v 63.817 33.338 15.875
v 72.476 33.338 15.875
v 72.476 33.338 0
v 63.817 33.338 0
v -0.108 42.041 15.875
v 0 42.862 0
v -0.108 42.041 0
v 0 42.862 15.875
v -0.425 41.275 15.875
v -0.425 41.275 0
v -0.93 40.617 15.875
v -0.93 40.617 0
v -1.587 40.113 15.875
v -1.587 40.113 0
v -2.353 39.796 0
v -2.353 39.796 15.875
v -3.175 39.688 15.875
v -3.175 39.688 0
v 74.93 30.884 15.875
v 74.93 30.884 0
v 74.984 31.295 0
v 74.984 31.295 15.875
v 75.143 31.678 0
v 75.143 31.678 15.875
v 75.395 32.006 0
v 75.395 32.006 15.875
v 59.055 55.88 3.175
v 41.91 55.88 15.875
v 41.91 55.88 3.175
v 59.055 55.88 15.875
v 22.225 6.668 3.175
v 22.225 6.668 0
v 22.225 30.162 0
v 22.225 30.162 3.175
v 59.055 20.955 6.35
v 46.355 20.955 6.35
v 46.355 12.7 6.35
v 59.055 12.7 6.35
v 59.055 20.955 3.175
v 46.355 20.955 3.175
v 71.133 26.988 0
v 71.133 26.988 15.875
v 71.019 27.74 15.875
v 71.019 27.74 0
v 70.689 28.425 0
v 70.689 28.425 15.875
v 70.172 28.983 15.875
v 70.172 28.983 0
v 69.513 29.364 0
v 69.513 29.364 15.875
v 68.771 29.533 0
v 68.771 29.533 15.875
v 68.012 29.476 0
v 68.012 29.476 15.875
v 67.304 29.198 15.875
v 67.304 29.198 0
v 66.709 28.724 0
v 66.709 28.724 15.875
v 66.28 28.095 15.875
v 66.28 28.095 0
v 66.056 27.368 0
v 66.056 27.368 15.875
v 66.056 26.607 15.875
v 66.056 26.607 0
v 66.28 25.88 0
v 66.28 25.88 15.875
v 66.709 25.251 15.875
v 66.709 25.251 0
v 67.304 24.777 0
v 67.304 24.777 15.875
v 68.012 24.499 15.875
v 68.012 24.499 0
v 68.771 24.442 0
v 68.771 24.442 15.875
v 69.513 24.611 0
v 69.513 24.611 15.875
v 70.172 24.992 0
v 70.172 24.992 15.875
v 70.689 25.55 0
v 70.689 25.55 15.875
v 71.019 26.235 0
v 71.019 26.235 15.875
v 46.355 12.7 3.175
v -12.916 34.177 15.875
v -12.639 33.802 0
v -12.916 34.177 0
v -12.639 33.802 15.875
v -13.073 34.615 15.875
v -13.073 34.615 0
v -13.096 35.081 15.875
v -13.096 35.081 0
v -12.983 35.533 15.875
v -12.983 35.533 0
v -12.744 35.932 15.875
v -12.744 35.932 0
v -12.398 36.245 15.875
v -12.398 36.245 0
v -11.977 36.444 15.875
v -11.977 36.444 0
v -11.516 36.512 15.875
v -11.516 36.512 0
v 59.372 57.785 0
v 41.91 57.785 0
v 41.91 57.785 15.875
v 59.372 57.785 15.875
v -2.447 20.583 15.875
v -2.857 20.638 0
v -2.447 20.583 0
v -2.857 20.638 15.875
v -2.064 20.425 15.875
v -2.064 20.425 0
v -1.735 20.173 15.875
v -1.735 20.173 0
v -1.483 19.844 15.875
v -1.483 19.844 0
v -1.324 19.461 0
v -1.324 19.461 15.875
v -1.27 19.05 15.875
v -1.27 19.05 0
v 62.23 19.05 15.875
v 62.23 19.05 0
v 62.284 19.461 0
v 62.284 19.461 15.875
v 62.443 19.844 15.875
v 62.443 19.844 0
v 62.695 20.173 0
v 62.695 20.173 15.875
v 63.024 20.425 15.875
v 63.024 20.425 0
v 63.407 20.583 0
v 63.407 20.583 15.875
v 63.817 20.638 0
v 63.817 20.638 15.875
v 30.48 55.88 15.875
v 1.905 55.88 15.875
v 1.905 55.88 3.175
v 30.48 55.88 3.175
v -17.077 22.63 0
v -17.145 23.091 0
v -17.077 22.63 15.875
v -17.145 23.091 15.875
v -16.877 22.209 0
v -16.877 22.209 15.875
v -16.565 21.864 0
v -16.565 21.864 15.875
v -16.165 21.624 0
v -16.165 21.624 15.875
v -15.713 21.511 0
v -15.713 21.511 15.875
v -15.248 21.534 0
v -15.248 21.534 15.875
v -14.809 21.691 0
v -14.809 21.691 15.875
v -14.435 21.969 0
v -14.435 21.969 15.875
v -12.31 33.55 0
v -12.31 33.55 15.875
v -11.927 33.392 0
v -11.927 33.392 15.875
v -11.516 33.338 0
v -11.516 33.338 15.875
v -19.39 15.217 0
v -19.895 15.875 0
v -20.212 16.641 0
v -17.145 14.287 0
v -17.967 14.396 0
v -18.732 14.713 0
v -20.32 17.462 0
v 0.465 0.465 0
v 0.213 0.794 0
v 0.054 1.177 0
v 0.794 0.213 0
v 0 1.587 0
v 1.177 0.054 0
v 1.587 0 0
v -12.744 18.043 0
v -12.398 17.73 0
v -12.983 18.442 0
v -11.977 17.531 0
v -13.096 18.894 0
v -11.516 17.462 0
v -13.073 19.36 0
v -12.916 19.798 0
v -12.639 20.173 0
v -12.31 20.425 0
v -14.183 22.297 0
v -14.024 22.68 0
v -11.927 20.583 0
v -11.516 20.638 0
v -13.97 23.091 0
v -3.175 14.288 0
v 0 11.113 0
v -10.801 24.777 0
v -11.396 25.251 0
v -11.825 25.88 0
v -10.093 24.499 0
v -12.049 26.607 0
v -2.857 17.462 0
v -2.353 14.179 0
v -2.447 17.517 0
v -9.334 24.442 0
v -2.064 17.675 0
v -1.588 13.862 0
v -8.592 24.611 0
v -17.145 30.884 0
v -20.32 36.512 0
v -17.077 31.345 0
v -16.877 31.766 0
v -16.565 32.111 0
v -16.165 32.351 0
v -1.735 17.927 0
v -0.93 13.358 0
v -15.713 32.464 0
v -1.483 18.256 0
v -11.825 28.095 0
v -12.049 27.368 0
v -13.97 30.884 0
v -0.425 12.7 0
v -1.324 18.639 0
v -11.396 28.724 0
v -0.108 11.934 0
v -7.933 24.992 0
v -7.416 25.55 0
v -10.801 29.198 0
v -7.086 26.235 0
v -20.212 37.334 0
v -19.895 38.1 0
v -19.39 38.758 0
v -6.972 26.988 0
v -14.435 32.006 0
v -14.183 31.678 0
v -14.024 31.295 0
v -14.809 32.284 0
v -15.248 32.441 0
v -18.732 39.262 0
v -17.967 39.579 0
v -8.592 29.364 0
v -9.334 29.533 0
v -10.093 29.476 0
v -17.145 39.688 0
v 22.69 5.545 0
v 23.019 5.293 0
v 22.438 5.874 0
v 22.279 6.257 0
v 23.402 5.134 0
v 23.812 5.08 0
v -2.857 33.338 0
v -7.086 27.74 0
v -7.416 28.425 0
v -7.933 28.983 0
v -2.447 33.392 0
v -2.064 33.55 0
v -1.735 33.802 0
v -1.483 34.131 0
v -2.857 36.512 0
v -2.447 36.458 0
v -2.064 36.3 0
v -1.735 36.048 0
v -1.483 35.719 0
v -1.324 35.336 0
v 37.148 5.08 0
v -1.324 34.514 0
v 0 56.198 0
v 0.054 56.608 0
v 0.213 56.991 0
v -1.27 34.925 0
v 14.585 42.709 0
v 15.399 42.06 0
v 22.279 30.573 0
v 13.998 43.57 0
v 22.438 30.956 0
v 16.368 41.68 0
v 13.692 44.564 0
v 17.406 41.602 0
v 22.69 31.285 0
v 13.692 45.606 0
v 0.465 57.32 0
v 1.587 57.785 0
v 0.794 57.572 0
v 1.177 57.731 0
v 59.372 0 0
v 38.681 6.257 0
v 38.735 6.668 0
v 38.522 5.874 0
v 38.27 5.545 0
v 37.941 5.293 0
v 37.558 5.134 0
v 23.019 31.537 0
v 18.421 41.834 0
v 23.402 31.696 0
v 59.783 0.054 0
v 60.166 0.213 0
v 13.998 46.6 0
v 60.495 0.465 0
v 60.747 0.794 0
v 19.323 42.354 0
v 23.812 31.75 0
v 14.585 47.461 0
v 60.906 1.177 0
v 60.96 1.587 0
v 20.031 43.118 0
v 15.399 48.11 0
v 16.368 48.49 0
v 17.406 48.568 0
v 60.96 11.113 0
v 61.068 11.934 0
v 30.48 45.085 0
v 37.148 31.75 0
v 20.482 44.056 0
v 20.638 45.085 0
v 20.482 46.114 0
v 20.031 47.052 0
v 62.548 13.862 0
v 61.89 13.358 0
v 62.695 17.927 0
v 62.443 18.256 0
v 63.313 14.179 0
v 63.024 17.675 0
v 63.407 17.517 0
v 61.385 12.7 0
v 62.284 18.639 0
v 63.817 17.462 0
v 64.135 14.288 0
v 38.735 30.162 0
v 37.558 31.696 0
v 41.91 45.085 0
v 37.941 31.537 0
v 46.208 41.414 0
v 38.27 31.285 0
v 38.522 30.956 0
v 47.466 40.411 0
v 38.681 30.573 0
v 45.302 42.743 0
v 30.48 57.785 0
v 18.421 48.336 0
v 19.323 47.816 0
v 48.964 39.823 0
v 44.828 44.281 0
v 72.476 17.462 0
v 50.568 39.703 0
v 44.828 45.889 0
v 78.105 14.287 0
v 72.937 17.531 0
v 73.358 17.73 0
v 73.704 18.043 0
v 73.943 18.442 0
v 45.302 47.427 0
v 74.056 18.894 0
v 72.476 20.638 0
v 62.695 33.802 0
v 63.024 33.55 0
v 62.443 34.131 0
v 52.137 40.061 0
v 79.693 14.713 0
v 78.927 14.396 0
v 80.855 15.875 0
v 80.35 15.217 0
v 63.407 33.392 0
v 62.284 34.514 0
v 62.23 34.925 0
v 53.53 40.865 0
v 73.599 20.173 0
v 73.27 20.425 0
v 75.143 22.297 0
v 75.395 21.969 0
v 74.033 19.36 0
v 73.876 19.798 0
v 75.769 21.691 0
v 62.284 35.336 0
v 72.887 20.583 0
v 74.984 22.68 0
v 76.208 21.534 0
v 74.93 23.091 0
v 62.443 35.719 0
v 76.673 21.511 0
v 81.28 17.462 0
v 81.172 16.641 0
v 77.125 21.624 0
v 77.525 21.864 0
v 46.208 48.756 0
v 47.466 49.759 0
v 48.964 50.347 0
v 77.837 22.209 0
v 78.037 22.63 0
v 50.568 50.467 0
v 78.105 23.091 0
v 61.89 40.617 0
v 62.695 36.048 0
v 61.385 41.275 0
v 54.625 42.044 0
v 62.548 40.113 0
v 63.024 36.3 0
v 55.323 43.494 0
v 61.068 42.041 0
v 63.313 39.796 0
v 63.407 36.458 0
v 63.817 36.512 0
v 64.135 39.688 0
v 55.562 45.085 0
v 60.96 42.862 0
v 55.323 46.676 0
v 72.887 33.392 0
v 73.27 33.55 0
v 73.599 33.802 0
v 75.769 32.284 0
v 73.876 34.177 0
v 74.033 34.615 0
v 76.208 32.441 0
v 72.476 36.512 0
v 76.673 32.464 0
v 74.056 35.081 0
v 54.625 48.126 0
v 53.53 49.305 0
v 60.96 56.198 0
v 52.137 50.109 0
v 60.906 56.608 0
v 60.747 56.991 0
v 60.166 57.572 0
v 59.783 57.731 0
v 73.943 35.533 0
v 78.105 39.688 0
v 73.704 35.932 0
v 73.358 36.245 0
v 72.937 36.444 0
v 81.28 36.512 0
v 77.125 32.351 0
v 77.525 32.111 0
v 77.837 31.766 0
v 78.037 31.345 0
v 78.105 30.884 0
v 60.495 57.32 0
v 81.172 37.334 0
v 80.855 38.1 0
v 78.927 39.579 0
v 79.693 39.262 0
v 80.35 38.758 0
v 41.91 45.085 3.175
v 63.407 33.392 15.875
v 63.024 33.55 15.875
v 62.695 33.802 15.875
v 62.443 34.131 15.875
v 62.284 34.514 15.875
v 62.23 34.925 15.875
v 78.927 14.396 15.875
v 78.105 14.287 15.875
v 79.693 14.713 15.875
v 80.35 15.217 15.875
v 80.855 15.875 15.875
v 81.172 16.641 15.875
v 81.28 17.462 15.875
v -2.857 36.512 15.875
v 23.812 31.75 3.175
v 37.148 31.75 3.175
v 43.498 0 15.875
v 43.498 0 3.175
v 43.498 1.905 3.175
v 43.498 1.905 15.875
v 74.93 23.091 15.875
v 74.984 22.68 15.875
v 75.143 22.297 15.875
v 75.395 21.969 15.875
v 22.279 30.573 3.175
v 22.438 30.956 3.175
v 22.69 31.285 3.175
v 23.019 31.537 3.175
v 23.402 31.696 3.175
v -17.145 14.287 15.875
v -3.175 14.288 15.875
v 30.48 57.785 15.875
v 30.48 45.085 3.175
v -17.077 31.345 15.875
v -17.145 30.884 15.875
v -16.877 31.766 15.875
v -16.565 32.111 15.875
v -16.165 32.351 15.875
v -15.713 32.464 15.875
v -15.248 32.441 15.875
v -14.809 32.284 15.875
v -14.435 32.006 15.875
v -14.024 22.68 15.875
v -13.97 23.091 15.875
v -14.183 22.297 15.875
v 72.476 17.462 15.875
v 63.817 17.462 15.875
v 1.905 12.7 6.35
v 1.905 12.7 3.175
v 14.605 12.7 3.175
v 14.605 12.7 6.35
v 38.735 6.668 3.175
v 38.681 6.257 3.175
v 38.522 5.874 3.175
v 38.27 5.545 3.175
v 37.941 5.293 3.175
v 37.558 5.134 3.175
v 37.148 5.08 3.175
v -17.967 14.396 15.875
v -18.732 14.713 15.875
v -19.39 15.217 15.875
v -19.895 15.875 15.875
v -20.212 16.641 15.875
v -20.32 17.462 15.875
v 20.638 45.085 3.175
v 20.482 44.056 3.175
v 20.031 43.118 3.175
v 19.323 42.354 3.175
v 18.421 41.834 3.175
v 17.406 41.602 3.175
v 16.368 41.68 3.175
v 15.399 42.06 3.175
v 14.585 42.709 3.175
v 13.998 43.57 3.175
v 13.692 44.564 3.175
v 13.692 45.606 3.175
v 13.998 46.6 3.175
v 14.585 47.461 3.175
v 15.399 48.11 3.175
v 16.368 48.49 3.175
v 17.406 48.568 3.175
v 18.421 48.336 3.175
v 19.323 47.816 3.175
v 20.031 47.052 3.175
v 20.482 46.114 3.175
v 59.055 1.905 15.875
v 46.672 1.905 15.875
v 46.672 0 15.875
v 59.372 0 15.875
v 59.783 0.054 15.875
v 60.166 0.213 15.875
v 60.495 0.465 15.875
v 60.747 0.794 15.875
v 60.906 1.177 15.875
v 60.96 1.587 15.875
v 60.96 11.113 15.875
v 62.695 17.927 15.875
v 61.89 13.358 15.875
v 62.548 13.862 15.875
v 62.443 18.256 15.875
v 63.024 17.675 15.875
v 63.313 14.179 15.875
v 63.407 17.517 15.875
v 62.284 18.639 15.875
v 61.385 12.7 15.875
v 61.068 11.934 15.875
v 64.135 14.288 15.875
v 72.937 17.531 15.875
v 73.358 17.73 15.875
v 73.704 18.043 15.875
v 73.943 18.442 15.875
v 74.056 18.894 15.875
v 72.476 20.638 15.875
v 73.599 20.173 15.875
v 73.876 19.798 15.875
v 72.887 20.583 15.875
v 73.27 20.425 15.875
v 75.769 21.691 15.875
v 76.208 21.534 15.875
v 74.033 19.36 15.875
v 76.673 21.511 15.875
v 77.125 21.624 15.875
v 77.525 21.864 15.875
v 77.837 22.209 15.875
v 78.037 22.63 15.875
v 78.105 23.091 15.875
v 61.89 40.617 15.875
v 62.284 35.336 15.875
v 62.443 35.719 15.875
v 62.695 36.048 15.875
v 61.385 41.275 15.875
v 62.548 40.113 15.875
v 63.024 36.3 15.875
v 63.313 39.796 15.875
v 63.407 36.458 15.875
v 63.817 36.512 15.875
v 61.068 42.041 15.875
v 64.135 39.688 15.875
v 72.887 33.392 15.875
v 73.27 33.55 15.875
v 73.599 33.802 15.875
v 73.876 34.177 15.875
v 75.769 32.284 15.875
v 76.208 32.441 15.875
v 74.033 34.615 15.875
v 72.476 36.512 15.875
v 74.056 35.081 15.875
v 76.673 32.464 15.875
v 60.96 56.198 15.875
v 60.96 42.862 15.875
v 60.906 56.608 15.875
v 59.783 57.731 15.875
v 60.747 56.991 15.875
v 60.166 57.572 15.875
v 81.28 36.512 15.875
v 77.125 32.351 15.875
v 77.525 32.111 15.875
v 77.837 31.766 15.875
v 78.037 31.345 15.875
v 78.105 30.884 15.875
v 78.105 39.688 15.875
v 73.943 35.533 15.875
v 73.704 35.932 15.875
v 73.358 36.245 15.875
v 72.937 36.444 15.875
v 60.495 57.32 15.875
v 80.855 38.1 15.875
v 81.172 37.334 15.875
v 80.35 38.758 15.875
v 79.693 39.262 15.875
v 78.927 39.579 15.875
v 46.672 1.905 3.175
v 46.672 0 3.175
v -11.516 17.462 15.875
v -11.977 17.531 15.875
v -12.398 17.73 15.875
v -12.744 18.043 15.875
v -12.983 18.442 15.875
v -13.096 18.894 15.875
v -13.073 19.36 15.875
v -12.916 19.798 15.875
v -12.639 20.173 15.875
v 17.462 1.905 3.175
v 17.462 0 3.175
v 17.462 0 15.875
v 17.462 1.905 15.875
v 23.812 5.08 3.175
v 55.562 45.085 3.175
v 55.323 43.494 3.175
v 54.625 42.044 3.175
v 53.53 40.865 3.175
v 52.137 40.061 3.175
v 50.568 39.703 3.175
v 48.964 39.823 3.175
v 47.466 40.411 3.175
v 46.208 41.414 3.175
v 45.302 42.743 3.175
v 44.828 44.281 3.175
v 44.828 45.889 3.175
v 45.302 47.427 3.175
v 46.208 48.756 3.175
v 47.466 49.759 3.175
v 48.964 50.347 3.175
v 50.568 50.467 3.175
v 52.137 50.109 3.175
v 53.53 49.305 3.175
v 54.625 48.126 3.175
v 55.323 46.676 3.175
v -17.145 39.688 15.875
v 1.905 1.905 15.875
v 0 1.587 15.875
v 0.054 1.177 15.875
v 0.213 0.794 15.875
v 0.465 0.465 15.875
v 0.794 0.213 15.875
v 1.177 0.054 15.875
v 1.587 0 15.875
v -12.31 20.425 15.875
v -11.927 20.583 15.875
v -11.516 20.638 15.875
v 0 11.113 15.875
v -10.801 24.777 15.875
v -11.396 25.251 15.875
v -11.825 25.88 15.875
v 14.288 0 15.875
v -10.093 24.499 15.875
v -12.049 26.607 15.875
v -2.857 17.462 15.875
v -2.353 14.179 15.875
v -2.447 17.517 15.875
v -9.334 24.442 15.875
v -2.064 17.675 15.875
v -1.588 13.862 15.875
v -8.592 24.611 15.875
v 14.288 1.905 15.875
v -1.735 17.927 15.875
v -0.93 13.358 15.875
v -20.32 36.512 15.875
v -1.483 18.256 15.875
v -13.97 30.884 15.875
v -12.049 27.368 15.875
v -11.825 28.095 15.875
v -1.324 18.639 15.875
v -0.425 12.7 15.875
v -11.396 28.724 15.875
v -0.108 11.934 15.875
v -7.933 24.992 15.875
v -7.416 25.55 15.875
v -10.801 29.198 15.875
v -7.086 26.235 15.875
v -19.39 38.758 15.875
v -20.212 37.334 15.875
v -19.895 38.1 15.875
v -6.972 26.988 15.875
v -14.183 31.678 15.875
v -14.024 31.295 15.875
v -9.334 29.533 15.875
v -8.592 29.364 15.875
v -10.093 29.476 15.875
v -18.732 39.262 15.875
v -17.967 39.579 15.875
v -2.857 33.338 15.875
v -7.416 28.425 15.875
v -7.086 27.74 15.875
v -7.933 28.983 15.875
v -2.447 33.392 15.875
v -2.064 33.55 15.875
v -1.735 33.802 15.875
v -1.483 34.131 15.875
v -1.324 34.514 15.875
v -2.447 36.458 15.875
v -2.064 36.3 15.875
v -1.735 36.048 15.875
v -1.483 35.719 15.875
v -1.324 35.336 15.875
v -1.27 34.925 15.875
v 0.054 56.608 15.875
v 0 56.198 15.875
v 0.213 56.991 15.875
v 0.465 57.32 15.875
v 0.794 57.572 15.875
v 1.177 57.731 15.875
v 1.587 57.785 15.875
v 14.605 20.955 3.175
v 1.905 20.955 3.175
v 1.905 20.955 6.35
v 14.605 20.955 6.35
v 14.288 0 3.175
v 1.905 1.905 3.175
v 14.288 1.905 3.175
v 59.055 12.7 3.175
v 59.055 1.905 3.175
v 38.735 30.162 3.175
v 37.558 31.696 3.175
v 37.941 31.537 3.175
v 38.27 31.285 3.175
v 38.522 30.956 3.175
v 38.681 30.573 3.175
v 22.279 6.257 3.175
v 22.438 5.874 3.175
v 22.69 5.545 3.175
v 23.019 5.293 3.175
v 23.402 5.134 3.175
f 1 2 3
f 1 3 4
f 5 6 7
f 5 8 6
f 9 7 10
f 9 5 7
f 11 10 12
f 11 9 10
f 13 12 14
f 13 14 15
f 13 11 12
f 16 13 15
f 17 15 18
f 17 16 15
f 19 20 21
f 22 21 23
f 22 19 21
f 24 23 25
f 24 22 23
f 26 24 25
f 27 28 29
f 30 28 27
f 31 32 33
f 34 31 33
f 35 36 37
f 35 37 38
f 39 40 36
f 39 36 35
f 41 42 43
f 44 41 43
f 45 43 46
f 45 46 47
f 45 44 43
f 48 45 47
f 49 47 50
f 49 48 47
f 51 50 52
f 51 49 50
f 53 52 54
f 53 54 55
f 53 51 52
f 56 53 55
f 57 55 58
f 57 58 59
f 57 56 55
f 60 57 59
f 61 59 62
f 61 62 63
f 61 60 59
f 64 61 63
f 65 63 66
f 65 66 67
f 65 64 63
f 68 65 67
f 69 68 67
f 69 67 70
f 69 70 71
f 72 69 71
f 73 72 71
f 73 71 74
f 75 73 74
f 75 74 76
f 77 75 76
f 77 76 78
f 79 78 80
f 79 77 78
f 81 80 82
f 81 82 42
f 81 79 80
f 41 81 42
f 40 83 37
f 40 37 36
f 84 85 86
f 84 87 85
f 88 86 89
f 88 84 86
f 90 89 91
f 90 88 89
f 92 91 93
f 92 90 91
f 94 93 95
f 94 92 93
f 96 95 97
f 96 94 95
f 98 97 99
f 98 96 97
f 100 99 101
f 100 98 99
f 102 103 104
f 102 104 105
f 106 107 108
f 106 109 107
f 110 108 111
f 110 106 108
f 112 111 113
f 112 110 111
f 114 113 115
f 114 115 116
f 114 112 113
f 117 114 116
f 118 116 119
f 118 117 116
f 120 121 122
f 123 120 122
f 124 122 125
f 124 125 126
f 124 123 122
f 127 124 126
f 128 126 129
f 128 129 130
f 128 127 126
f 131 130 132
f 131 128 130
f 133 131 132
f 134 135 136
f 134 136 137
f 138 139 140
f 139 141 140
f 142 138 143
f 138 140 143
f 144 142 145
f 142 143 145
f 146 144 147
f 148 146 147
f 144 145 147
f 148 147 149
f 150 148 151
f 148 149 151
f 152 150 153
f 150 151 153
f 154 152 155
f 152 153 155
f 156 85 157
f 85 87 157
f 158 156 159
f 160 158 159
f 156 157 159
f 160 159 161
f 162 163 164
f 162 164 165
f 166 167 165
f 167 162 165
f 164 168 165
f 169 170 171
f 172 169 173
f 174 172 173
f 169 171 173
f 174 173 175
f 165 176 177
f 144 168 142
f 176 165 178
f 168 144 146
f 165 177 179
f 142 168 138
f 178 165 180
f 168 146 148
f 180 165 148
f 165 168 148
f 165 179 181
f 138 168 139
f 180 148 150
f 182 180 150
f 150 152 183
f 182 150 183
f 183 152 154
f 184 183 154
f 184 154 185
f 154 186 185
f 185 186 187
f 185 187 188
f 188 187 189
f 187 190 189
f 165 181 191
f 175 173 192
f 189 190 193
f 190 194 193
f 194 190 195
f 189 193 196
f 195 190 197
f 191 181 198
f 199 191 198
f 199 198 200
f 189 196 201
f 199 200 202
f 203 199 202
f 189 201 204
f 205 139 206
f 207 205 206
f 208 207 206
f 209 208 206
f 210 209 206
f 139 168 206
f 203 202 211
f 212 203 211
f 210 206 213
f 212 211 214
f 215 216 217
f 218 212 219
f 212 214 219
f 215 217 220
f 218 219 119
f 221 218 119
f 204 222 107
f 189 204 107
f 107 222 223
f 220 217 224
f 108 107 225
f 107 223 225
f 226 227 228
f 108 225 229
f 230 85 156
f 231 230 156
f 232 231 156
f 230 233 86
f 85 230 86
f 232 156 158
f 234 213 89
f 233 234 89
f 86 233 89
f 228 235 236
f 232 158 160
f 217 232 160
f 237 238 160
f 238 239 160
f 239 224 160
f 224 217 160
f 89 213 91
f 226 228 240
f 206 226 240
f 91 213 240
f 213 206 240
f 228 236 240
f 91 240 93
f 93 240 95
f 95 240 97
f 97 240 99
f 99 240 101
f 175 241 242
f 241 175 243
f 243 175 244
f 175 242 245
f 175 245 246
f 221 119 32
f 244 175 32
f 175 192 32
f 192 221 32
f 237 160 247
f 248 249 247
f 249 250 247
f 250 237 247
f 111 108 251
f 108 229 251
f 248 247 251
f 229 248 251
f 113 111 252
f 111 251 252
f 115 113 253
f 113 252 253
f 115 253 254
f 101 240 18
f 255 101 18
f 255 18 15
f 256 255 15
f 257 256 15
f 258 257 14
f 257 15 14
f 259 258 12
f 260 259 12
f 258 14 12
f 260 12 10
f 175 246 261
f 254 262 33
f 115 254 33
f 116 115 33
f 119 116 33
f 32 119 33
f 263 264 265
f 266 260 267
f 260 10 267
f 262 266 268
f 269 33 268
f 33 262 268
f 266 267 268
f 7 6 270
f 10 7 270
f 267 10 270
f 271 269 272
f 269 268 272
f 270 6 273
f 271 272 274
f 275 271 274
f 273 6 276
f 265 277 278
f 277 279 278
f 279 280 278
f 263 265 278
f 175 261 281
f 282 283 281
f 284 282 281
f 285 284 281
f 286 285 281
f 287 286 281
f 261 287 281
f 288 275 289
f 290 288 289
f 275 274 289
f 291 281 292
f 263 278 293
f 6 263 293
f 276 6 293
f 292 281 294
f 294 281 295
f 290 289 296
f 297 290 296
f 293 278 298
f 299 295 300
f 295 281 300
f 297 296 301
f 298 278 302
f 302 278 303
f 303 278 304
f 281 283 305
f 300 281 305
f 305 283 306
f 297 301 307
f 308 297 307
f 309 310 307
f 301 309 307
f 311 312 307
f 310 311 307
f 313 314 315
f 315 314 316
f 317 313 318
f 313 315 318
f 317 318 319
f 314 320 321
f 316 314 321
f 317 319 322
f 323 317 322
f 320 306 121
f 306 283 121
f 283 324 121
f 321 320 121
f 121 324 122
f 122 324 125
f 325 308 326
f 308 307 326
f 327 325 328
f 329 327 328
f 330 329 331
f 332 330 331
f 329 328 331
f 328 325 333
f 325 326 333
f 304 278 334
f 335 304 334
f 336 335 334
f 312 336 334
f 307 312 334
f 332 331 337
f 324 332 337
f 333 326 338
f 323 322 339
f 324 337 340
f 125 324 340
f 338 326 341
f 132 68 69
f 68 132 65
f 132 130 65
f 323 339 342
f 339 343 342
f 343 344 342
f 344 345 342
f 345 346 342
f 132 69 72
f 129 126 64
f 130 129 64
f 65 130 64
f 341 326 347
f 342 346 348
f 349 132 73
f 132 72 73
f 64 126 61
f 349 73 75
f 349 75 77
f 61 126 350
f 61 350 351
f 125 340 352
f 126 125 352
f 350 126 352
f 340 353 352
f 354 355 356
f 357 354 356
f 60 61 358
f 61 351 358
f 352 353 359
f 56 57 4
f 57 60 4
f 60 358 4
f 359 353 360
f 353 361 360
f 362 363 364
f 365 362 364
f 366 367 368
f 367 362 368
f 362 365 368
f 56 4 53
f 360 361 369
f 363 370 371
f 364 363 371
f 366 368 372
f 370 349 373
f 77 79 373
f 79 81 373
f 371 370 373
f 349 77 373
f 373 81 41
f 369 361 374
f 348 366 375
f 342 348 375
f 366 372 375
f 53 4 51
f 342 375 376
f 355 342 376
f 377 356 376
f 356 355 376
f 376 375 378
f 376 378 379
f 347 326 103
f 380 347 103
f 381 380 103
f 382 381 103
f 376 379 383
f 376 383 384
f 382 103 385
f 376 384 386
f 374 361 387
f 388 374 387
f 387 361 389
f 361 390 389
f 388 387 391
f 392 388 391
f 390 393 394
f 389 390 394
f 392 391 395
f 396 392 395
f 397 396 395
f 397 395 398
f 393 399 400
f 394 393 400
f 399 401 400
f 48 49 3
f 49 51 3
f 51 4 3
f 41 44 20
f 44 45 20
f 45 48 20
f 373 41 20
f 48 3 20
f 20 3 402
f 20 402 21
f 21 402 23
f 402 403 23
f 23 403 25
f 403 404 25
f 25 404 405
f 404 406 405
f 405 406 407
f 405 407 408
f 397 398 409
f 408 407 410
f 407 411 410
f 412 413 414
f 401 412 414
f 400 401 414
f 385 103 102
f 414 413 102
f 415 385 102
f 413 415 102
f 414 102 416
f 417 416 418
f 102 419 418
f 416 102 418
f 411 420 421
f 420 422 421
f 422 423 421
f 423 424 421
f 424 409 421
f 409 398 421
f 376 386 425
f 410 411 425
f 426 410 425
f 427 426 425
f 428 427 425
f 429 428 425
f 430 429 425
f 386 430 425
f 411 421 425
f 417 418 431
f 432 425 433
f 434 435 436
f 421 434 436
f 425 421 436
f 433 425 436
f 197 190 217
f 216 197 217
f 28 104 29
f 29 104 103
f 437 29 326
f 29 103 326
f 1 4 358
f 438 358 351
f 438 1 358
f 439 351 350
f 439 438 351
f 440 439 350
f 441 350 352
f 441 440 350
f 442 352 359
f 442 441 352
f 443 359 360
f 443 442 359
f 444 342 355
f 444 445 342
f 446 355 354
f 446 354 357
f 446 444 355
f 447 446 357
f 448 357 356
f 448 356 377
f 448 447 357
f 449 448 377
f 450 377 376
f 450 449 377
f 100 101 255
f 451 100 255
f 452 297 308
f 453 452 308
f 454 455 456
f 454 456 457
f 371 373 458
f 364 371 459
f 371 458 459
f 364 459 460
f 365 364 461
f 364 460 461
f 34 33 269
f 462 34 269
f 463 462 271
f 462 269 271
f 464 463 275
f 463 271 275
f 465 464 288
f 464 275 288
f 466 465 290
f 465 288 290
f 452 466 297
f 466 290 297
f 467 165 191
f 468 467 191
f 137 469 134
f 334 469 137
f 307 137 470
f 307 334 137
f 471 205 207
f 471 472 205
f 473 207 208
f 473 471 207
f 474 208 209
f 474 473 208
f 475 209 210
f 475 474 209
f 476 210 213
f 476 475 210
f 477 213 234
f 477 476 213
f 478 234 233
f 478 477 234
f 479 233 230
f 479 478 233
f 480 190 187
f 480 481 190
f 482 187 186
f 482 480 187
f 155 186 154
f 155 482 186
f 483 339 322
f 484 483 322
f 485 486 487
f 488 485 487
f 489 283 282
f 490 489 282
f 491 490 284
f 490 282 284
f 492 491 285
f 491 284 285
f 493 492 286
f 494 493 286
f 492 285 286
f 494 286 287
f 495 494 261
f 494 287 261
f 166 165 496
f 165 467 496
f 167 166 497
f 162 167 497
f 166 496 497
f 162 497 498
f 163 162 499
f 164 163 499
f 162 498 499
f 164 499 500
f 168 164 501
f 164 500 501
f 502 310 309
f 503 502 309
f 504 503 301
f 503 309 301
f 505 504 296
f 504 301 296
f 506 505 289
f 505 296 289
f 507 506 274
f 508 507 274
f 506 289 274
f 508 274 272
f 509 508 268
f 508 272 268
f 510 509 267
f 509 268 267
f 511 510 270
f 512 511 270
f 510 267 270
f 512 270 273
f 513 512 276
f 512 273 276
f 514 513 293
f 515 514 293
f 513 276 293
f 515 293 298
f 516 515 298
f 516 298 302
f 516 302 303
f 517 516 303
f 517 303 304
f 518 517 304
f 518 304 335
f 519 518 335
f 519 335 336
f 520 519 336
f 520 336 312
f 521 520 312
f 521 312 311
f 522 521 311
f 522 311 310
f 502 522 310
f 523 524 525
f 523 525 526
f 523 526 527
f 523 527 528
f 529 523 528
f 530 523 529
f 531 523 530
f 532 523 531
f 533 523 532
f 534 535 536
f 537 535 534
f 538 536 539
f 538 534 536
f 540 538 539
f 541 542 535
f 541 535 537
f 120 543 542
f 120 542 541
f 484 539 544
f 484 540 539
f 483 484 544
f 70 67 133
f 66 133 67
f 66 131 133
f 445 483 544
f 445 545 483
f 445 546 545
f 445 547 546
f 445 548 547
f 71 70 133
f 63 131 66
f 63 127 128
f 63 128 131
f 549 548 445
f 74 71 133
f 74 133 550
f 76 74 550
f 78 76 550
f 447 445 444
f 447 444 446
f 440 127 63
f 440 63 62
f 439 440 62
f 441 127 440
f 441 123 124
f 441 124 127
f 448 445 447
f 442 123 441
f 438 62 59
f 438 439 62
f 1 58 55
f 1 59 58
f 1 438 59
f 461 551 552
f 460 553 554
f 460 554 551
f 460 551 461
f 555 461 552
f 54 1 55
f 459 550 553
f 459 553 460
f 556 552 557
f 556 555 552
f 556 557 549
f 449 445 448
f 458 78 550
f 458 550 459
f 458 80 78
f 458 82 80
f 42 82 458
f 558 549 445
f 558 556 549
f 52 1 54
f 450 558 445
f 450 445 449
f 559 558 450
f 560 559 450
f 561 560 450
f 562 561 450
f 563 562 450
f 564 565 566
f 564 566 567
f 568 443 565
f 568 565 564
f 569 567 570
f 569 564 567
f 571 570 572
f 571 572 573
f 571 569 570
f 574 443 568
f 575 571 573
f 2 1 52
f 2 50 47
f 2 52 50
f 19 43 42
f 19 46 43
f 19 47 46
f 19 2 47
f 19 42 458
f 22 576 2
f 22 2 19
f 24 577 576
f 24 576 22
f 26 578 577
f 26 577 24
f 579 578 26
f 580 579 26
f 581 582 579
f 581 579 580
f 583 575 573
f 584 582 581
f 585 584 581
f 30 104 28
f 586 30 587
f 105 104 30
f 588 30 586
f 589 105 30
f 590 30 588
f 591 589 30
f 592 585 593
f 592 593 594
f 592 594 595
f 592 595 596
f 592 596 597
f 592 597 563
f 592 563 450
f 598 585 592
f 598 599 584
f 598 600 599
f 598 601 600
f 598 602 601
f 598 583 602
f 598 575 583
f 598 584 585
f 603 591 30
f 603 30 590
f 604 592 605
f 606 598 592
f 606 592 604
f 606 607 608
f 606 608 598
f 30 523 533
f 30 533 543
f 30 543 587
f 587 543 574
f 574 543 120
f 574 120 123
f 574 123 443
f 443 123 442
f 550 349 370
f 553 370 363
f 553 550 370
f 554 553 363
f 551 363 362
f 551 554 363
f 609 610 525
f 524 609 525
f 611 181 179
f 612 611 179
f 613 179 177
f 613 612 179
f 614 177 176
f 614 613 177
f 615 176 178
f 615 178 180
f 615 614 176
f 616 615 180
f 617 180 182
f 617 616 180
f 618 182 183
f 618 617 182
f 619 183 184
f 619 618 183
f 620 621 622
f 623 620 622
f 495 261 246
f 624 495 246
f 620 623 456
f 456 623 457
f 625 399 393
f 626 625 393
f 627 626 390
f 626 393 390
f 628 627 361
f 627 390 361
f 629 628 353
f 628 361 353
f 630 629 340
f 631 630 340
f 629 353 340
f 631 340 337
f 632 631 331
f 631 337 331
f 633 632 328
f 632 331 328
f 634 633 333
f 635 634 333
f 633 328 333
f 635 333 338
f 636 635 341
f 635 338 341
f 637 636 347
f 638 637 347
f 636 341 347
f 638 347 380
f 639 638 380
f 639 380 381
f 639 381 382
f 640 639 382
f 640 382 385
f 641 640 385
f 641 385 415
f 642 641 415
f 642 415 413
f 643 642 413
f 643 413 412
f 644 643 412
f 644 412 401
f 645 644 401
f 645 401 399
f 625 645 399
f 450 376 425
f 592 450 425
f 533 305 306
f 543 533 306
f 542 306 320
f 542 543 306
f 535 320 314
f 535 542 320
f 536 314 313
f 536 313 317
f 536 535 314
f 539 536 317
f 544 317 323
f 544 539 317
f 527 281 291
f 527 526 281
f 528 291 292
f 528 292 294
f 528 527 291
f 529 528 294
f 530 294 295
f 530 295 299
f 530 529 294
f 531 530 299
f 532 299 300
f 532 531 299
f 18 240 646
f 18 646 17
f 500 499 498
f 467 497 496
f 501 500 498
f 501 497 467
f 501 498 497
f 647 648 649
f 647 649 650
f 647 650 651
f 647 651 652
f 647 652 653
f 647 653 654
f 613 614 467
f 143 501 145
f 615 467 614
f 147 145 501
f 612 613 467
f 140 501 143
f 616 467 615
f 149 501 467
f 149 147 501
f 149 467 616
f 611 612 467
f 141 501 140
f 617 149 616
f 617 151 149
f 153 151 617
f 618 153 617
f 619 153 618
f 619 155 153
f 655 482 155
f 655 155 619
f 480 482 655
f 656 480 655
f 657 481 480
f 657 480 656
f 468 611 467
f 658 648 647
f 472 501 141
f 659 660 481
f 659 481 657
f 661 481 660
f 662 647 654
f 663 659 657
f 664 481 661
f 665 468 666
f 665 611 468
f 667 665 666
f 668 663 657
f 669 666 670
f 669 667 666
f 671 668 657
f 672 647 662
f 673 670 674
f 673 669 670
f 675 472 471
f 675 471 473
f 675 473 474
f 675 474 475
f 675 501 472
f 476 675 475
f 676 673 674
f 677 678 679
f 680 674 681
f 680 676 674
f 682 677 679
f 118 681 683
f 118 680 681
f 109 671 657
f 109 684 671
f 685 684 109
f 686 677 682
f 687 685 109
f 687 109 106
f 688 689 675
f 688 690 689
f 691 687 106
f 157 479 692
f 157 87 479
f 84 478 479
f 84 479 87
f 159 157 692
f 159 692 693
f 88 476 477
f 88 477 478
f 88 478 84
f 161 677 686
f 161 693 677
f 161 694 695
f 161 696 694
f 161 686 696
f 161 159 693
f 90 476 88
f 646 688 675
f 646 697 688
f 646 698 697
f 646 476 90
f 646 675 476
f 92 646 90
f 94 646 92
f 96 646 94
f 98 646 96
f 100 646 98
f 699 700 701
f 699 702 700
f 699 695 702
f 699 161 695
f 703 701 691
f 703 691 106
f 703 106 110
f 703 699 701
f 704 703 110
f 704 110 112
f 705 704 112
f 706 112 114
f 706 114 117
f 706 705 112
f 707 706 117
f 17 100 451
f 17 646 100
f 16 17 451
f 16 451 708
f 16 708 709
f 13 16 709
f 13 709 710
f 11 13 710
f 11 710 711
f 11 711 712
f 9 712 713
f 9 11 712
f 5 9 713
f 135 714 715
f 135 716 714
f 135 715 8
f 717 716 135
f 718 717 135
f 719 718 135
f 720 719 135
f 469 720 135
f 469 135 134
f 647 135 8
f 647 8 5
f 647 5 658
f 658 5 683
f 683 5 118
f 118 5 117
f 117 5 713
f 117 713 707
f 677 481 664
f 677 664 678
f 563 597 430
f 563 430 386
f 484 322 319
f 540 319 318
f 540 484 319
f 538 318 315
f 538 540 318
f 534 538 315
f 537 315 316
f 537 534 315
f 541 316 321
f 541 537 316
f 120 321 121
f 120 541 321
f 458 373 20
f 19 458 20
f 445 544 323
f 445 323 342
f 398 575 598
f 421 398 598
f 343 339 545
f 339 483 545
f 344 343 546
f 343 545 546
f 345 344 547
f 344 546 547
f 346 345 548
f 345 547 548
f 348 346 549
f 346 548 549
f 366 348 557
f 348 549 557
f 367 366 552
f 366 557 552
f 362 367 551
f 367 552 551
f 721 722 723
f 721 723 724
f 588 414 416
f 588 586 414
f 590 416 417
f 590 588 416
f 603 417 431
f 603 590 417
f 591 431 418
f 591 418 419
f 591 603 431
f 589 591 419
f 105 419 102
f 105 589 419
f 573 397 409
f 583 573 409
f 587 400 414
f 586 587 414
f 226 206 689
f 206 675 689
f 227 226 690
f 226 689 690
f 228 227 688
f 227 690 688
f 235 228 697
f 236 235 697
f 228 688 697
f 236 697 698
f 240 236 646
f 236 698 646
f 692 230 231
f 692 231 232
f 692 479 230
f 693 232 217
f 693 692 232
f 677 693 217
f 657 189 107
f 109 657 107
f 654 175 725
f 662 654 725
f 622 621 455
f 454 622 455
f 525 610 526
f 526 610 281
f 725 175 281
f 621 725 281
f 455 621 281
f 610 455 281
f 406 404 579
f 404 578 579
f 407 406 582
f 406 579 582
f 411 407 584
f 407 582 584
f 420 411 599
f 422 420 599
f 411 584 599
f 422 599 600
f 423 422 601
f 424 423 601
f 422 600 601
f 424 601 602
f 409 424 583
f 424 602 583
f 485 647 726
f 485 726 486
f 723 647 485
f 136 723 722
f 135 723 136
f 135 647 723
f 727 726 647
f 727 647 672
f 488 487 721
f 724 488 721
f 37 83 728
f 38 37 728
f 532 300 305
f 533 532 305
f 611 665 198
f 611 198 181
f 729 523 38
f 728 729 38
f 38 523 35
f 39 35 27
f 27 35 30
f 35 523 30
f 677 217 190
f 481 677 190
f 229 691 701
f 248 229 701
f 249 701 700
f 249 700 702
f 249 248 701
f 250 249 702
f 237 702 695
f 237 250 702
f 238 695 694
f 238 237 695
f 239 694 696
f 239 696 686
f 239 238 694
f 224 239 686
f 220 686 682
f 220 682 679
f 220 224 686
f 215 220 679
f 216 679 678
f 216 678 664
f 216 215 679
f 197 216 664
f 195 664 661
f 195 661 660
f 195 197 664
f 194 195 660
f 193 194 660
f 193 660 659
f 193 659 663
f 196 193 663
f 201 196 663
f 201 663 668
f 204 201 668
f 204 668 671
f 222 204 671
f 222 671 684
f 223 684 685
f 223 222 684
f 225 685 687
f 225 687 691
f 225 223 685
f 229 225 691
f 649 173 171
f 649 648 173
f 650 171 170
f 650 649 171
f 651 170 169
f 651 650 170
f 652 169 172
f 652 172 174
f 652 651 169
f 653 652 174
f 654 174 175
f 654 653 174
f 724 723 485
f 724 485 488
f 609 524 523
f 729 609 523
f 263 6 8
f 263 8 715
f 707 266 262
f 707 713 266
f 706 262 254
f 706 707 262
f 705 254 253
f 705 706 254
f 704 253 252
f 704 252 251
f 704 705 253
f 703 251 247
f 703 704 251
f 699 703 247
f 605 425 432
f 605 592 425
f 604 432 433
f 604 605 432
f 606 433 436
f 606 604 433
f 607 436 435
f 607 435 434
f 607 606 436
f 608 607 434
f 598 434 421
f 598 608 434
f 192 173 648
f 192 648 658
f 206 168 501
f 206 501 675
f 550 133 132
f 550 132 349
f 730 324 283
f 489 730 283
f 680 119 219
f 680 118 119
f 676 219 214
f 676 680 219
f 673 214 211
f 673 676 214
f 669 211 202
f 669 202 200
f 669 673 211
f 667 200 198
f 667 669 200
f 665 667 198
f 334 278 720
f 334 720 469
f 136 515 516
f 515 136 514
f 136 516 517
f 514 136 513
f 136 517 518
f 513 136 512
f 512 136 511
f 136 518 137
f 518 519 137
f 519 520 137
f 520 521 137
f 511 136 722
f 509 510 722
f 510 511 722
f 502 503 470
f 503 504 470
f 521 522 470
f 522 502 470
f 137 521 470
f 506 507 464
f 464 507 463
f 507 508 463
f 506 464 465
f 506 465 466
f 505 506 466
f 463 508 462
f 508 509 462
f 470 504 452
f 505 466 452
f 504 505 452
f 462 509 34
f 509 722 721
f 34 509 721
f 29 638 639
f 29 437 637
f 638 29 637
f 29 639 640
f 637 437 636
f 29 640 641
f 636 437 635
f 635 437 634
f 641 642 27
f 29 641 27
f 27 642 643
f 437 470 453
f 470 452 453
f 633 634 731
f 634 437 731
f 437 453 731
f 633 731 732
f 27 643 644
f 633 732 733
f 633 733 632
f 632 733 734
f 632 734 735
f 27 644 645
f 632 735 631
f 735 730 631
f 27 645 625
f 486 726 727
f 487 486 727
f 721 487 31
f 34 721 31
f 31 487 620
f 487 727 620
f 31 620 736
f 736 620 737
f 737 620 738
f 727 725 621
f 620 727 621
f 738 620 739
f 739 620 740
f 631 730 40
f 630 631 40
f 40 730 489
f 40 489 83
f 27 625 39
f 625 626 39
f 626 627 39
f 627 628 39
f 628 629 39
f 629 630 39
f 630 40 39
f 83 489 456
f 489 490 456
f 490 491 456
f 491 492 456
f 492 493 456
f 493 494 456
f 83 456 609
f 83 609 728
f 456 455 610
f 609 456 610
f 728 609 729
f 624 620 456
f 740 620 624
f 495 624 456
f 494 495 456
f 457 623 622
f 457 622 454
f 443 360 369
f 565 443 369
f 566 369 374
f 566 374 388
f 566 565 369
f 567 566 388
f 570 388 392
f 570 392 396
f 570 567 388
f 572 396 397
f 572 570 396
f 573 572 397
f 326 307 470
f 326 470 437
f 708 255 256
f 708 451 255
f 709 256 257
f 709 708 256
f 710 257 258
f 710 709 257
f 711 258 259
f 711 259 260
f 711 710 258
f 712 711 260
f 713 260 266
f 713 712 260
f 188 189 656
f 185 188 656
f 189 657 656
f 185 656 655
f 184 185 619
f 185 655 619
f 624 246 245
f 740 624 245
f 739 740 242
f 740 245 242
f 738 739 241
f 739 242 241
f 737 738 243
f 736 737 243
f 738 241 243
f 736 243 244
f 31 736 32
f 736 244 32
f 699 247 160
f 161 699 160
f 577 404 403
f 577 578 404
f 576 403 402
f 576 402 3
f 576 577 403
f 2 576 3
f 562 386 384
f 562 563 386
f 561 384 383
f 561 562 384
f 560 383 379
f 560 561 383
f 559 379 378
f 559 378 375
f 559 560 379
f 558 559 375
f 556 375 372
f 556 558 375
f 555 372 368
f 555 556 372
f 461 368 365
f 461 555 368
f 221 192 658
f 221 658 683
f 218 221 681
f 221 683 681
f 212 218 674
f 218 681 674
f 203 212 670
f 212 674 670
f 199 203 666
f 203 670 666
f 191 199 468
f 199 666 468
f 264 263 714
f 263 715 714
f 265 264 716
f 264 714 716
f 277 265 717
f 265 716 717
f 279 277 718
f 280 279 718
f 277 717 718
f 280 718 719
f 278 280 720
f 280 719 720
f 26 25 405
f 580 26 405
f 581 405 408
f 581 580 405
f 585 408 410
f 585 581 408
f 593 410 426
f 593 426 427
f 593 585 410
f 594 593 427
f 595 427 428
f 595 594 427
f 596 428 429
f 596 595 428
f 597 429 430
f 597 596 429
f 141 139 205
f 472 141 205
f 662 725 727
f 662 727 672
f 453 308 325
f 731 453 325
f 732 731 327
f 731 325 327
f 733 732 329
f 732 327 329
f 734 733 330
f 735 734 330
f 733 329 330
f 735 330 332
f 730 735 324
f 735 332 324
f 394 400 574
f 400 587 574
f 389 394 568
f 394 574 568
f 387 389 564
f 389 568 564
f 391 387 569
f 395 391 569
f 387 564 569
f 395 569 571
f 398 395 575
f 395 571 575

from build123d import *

# Parameters (mm, degrees)
F0_W      = 60.96
F0_H      = 57.785
F1_DEPTH  = 15.875
F2_W      = 57.15
F2_H      = 53.975
F3_DEPTH  = 12.7
F4_R      = 3.4925
F4_R_2    = 5.3975
F5_DEPTH  = 15.876
F6_W      = 12.7
F6_H      = 8.255
F7_DEPTH  = 3.175
F4_W      = 11.43
F4_H      = 12.7
F10_DEPTH = 25.4
F11_R     = 1.5875
F12_W     = 20.32
F12_H     = 25.4
F12_R     = 2.5527
F13_DEPTH = 15.875
F14_R     = 3.175
F15_R     = 1.58749
F16_W     = 3.175
F16_H     = 12.7
F17_DEPTH = 1.905


# Not quite as in the source:
# - a fillet or chamfer is up to 0.001 mm smaller than in the source, because OpenCascade refuses the exact size
# - a feature names something its author has since deleted; it is built from what else it names


with BuildPart() as f1:
    # F0 (on Top) → F1 (new body)
    with BuildSketch(Plane.XY):
        with Locations((30.48, 28.8925)):
            Rectangle(F0_W, F0_H)
    extrude(amount=F1_DEPTH)

    # F2 (on face) → F3 (cut)
    with BuildSketch(Plane.XY.offset(15.875)):
        with Locations((30.48, 28.8925)):
            Rectangle(F2_W, F2_H)
    extrude(amount=-F3_DEPTH, mode=Mode.SUBTRACT)

    # F4 (on face) → F5 (cut, through all)
    with BuildSketch(Plane(origin=(0, 0, 0), x_dir=(1, 0, 0), z_dir=(0, 0, -1))):
        with Locations((17.145, -45.085)):
            Circle(F4_R)
        with Locations((50.165, -45.085)):
            Circle(F4_R_2)
        with BuildLine():
            Line((37.1475, -5.08), (23.8125, -5.08))
            ThreePointArc((23.8125, -5.08), (22.6899679849, -5.5449679849), (22.225, -6.6675))
            Line((22.225, -6.6675), (22.225, -30.1625))
            ThreePointArc((22.225, -30.1625), (22.6899679849, -31.2850320151), (23.8125, -31.75))
            Line((23.8125, -31.75), (37.1475, -31.75))
            ThreePointArc((37.1475, -31.75), (38.2700320151, -31.2850320151), (38.735, -30.1625))
            Line((38.735, -30.1625), (38.735, -6.6675))
            ThreePointArc((38.735, -6.6675), (38.2700320151, -5.5449679849), (37.1475, -5.08))
        make_face()
    extrude(amount=-F5_DEPTH, mode=Mode.SUBTRACT)

    # F6 (on face) → F7 (join)
    with BuildSketch(Plane.XY.offset(3.175)):
        with Locations((8.255, 16.8275)):
            Rectangle(F6_W, F6_H)
        with Locations((52.705, 16.8275)):
            Rectangle(F6_W, F6_H)
    extrude(amount=F7_DEPTH)

    # F4 (on face) → F10 (cut)
    with BuildSketch(Plane(origin=(0, 0, 0), x_dir=(1, 0, 0), z_dir=(0, 0, -1))):
        with Locations((36.195, -51.435)):
            Rectangle(F4_W, F4_H)
    extrude(amount=-F10_DEPTH, mode=Mode.SUBTRACT)

    # F11
    f11_edges = [f1.edges().sort_by_distance(p)[0] for p in [
        (0, 57.785, 7.9375),
        (0, 0, 7.9375),
        (60.96, 57.785, 7.9375),
        (60.96, 0, 7.9375),
    ]]
    fillet(f11_edges, radius=F11_R)

    # F12 (on Top) → F13 (join, through all)
    with BuildSketch(Plane.XY):
        with Locations((-10.16, 26.9875)):
            Rectangle(F12_W, F12_H)
        with Locations((-9.525, 26.9875)):
            Circle(F12_R, mode=Mode.SUBTRACT)
        Polygon((-12.1739487758, 20.6375), (-1.27, 20.6375), (-1.27, 17.4625), (-15.3489487758, 17.4625), (-17.145, 17.4625), (-17.145, 19.2585512242), (-17.145, 34.7164487758), (-17.145, 36.5125), (-15.3489487758, 36.5125), (-1.27, 36.5125), (-1.27, 33.3375), (-12.1739487758, 33.3375), (-13.97, 33.3375), (-13.97, 31.5414487758), (-13.97, 22.4335512242), (-13.97, 20.6375), align=None, mode=Mode.SUBTRACT)
        with Locations((71.12, 26.9875)):
            Rectangle(F12_W, F12_H)
        with Locations((68.58, 26.9875)):
            Circle(F12_R, mode=Mode.SUBTRACT)
        Polygon((76.3089487758, 17.4625), (62.23, 17.4625), (62.23, 20.6375), (73.1339487758, 20.6375), (74.93, 20.6375), (74.93, 22.4335512242), (74.93, 31.5414487758), (74.93, 33.3375), (73.1339487758, 33.3375), (62.23, 33.3375), (62.23, 36.5125), (76.3089487758, 36.5125), (78.105, 36.5125), (78.105, 34.7164487758), (78.105, 19.2585512242), (78.105, 17.4625), align=None, mode=Mode.SUBTRACT)
        Polygon((73.1339487758, 20.6375), (76.3089487758, 17.4625), (78.105, 17.4625), (78.105, 19.2585512242), (74.93, 22.4335512242), (74.93, 20.6375), align=None)
        Polygon((74.93, 31.5414487758), (78.105, 34.7164487758), (78.105, 36.5125), (76.3089487758, 36.5125), (73.1339487758, 33.3375), (74.93, 33.3375), align=None)
        Polygon((-17.145, 34.7164487758), (-13.97, 31.5414487758), (-13.97, 33.3375), (-12.1739487758, 33.3375), (-15.3489487758, 36.5125), (-17.145, 36.5125), align=None)
        Polygon((-15.3489487758, 17.4625), (-12.1739487758, 20.6375), (-13.97, 20.6375), (-13.97, 22.4335512242), (-17.145, 19.2585512242), (-17.145, 17.4625), align=None)
    extrude(amount=F13_DEPTH)

    # F14
    f14_edges = [f1.edges().sort_by_distance(p)[0] for p in [
        (-20.32, 14.2875, 7.9375),
        (0, 14.2875, 7.9375),
        (-20.32, 39.6875, 7.9375),
        (0, 39.6875, 7.9375),
        (60.96, 14.2875, 7.9375),
        (81.28, 14.2875, 7.9375),
        (81.28, 39.6875, 7.9375),
        (60.96, 39.6875, 7.9375),
    ]]
    fillet(f14_edges, radius=F14_R)

    # F15 (radius 1.5875 in the source; OpenCascade refuses exactly that, so slightly less here)
    f15_edges = [f1.edges().sort_by_distance(p)[0] for p in [
        (62.23, 17.4625, 7.9375),
        (62.23, 20.6375, 7.9375),
        (62.23, 33.3375, 7.9375),
        (62.23, 36.5125, 7.9375),
        (76.308949, 17.4625, 7.9375),
        (78.105, 19.258551, 7.9375),
        (78.105, 34.716449, 7.9375),
        (74.93, 31.541449, 7.9375),
        (74.93, 22.433551, 7.9375),
        (73.133949, 20.6375, 7.9375),
        (73.133949, 33.3375, 7.9375),
        (76.308949, 36.5125, 7.9375),
        (-1.27, 33.3375, 7.9375),
        (-1.27, 36.5125, 7.9375),
        (-15.348949, 36.5125, 7.9375),
        (-12.173949, 33.3375, 7.9375),
        (-15.348949, 17.4625, 7.9375),
        (-12.173949, 20.6375, 7.9375),
        (-1.27, 17.4625, 7.9375),
        (-1.27, 20.6375, 7.9375),
        (-17.145, 19.258551, 7.9375),
        (-13.97, 22.433551, 7.9375),
        (-17.145, 34.716449, 7.9375),
        (-13.97, 31.541449, 7.9375),
    ]]
    fillet(f15_edges, radius=F15_R)

    # F16 (on face) → F17 (cut, through all)
    with BuildSketch(Plane.XZ):
        with Locations((15.875, 9.525)):
            Rectangle(F16_W, F16_H)
        with Locations((45.085, 9.525)):
            Rectangle(F16_W, F16_H)
    extrude(amount=-F17_DEPTH, mode=Mode.SUBTRACT)


solid = f1.part
